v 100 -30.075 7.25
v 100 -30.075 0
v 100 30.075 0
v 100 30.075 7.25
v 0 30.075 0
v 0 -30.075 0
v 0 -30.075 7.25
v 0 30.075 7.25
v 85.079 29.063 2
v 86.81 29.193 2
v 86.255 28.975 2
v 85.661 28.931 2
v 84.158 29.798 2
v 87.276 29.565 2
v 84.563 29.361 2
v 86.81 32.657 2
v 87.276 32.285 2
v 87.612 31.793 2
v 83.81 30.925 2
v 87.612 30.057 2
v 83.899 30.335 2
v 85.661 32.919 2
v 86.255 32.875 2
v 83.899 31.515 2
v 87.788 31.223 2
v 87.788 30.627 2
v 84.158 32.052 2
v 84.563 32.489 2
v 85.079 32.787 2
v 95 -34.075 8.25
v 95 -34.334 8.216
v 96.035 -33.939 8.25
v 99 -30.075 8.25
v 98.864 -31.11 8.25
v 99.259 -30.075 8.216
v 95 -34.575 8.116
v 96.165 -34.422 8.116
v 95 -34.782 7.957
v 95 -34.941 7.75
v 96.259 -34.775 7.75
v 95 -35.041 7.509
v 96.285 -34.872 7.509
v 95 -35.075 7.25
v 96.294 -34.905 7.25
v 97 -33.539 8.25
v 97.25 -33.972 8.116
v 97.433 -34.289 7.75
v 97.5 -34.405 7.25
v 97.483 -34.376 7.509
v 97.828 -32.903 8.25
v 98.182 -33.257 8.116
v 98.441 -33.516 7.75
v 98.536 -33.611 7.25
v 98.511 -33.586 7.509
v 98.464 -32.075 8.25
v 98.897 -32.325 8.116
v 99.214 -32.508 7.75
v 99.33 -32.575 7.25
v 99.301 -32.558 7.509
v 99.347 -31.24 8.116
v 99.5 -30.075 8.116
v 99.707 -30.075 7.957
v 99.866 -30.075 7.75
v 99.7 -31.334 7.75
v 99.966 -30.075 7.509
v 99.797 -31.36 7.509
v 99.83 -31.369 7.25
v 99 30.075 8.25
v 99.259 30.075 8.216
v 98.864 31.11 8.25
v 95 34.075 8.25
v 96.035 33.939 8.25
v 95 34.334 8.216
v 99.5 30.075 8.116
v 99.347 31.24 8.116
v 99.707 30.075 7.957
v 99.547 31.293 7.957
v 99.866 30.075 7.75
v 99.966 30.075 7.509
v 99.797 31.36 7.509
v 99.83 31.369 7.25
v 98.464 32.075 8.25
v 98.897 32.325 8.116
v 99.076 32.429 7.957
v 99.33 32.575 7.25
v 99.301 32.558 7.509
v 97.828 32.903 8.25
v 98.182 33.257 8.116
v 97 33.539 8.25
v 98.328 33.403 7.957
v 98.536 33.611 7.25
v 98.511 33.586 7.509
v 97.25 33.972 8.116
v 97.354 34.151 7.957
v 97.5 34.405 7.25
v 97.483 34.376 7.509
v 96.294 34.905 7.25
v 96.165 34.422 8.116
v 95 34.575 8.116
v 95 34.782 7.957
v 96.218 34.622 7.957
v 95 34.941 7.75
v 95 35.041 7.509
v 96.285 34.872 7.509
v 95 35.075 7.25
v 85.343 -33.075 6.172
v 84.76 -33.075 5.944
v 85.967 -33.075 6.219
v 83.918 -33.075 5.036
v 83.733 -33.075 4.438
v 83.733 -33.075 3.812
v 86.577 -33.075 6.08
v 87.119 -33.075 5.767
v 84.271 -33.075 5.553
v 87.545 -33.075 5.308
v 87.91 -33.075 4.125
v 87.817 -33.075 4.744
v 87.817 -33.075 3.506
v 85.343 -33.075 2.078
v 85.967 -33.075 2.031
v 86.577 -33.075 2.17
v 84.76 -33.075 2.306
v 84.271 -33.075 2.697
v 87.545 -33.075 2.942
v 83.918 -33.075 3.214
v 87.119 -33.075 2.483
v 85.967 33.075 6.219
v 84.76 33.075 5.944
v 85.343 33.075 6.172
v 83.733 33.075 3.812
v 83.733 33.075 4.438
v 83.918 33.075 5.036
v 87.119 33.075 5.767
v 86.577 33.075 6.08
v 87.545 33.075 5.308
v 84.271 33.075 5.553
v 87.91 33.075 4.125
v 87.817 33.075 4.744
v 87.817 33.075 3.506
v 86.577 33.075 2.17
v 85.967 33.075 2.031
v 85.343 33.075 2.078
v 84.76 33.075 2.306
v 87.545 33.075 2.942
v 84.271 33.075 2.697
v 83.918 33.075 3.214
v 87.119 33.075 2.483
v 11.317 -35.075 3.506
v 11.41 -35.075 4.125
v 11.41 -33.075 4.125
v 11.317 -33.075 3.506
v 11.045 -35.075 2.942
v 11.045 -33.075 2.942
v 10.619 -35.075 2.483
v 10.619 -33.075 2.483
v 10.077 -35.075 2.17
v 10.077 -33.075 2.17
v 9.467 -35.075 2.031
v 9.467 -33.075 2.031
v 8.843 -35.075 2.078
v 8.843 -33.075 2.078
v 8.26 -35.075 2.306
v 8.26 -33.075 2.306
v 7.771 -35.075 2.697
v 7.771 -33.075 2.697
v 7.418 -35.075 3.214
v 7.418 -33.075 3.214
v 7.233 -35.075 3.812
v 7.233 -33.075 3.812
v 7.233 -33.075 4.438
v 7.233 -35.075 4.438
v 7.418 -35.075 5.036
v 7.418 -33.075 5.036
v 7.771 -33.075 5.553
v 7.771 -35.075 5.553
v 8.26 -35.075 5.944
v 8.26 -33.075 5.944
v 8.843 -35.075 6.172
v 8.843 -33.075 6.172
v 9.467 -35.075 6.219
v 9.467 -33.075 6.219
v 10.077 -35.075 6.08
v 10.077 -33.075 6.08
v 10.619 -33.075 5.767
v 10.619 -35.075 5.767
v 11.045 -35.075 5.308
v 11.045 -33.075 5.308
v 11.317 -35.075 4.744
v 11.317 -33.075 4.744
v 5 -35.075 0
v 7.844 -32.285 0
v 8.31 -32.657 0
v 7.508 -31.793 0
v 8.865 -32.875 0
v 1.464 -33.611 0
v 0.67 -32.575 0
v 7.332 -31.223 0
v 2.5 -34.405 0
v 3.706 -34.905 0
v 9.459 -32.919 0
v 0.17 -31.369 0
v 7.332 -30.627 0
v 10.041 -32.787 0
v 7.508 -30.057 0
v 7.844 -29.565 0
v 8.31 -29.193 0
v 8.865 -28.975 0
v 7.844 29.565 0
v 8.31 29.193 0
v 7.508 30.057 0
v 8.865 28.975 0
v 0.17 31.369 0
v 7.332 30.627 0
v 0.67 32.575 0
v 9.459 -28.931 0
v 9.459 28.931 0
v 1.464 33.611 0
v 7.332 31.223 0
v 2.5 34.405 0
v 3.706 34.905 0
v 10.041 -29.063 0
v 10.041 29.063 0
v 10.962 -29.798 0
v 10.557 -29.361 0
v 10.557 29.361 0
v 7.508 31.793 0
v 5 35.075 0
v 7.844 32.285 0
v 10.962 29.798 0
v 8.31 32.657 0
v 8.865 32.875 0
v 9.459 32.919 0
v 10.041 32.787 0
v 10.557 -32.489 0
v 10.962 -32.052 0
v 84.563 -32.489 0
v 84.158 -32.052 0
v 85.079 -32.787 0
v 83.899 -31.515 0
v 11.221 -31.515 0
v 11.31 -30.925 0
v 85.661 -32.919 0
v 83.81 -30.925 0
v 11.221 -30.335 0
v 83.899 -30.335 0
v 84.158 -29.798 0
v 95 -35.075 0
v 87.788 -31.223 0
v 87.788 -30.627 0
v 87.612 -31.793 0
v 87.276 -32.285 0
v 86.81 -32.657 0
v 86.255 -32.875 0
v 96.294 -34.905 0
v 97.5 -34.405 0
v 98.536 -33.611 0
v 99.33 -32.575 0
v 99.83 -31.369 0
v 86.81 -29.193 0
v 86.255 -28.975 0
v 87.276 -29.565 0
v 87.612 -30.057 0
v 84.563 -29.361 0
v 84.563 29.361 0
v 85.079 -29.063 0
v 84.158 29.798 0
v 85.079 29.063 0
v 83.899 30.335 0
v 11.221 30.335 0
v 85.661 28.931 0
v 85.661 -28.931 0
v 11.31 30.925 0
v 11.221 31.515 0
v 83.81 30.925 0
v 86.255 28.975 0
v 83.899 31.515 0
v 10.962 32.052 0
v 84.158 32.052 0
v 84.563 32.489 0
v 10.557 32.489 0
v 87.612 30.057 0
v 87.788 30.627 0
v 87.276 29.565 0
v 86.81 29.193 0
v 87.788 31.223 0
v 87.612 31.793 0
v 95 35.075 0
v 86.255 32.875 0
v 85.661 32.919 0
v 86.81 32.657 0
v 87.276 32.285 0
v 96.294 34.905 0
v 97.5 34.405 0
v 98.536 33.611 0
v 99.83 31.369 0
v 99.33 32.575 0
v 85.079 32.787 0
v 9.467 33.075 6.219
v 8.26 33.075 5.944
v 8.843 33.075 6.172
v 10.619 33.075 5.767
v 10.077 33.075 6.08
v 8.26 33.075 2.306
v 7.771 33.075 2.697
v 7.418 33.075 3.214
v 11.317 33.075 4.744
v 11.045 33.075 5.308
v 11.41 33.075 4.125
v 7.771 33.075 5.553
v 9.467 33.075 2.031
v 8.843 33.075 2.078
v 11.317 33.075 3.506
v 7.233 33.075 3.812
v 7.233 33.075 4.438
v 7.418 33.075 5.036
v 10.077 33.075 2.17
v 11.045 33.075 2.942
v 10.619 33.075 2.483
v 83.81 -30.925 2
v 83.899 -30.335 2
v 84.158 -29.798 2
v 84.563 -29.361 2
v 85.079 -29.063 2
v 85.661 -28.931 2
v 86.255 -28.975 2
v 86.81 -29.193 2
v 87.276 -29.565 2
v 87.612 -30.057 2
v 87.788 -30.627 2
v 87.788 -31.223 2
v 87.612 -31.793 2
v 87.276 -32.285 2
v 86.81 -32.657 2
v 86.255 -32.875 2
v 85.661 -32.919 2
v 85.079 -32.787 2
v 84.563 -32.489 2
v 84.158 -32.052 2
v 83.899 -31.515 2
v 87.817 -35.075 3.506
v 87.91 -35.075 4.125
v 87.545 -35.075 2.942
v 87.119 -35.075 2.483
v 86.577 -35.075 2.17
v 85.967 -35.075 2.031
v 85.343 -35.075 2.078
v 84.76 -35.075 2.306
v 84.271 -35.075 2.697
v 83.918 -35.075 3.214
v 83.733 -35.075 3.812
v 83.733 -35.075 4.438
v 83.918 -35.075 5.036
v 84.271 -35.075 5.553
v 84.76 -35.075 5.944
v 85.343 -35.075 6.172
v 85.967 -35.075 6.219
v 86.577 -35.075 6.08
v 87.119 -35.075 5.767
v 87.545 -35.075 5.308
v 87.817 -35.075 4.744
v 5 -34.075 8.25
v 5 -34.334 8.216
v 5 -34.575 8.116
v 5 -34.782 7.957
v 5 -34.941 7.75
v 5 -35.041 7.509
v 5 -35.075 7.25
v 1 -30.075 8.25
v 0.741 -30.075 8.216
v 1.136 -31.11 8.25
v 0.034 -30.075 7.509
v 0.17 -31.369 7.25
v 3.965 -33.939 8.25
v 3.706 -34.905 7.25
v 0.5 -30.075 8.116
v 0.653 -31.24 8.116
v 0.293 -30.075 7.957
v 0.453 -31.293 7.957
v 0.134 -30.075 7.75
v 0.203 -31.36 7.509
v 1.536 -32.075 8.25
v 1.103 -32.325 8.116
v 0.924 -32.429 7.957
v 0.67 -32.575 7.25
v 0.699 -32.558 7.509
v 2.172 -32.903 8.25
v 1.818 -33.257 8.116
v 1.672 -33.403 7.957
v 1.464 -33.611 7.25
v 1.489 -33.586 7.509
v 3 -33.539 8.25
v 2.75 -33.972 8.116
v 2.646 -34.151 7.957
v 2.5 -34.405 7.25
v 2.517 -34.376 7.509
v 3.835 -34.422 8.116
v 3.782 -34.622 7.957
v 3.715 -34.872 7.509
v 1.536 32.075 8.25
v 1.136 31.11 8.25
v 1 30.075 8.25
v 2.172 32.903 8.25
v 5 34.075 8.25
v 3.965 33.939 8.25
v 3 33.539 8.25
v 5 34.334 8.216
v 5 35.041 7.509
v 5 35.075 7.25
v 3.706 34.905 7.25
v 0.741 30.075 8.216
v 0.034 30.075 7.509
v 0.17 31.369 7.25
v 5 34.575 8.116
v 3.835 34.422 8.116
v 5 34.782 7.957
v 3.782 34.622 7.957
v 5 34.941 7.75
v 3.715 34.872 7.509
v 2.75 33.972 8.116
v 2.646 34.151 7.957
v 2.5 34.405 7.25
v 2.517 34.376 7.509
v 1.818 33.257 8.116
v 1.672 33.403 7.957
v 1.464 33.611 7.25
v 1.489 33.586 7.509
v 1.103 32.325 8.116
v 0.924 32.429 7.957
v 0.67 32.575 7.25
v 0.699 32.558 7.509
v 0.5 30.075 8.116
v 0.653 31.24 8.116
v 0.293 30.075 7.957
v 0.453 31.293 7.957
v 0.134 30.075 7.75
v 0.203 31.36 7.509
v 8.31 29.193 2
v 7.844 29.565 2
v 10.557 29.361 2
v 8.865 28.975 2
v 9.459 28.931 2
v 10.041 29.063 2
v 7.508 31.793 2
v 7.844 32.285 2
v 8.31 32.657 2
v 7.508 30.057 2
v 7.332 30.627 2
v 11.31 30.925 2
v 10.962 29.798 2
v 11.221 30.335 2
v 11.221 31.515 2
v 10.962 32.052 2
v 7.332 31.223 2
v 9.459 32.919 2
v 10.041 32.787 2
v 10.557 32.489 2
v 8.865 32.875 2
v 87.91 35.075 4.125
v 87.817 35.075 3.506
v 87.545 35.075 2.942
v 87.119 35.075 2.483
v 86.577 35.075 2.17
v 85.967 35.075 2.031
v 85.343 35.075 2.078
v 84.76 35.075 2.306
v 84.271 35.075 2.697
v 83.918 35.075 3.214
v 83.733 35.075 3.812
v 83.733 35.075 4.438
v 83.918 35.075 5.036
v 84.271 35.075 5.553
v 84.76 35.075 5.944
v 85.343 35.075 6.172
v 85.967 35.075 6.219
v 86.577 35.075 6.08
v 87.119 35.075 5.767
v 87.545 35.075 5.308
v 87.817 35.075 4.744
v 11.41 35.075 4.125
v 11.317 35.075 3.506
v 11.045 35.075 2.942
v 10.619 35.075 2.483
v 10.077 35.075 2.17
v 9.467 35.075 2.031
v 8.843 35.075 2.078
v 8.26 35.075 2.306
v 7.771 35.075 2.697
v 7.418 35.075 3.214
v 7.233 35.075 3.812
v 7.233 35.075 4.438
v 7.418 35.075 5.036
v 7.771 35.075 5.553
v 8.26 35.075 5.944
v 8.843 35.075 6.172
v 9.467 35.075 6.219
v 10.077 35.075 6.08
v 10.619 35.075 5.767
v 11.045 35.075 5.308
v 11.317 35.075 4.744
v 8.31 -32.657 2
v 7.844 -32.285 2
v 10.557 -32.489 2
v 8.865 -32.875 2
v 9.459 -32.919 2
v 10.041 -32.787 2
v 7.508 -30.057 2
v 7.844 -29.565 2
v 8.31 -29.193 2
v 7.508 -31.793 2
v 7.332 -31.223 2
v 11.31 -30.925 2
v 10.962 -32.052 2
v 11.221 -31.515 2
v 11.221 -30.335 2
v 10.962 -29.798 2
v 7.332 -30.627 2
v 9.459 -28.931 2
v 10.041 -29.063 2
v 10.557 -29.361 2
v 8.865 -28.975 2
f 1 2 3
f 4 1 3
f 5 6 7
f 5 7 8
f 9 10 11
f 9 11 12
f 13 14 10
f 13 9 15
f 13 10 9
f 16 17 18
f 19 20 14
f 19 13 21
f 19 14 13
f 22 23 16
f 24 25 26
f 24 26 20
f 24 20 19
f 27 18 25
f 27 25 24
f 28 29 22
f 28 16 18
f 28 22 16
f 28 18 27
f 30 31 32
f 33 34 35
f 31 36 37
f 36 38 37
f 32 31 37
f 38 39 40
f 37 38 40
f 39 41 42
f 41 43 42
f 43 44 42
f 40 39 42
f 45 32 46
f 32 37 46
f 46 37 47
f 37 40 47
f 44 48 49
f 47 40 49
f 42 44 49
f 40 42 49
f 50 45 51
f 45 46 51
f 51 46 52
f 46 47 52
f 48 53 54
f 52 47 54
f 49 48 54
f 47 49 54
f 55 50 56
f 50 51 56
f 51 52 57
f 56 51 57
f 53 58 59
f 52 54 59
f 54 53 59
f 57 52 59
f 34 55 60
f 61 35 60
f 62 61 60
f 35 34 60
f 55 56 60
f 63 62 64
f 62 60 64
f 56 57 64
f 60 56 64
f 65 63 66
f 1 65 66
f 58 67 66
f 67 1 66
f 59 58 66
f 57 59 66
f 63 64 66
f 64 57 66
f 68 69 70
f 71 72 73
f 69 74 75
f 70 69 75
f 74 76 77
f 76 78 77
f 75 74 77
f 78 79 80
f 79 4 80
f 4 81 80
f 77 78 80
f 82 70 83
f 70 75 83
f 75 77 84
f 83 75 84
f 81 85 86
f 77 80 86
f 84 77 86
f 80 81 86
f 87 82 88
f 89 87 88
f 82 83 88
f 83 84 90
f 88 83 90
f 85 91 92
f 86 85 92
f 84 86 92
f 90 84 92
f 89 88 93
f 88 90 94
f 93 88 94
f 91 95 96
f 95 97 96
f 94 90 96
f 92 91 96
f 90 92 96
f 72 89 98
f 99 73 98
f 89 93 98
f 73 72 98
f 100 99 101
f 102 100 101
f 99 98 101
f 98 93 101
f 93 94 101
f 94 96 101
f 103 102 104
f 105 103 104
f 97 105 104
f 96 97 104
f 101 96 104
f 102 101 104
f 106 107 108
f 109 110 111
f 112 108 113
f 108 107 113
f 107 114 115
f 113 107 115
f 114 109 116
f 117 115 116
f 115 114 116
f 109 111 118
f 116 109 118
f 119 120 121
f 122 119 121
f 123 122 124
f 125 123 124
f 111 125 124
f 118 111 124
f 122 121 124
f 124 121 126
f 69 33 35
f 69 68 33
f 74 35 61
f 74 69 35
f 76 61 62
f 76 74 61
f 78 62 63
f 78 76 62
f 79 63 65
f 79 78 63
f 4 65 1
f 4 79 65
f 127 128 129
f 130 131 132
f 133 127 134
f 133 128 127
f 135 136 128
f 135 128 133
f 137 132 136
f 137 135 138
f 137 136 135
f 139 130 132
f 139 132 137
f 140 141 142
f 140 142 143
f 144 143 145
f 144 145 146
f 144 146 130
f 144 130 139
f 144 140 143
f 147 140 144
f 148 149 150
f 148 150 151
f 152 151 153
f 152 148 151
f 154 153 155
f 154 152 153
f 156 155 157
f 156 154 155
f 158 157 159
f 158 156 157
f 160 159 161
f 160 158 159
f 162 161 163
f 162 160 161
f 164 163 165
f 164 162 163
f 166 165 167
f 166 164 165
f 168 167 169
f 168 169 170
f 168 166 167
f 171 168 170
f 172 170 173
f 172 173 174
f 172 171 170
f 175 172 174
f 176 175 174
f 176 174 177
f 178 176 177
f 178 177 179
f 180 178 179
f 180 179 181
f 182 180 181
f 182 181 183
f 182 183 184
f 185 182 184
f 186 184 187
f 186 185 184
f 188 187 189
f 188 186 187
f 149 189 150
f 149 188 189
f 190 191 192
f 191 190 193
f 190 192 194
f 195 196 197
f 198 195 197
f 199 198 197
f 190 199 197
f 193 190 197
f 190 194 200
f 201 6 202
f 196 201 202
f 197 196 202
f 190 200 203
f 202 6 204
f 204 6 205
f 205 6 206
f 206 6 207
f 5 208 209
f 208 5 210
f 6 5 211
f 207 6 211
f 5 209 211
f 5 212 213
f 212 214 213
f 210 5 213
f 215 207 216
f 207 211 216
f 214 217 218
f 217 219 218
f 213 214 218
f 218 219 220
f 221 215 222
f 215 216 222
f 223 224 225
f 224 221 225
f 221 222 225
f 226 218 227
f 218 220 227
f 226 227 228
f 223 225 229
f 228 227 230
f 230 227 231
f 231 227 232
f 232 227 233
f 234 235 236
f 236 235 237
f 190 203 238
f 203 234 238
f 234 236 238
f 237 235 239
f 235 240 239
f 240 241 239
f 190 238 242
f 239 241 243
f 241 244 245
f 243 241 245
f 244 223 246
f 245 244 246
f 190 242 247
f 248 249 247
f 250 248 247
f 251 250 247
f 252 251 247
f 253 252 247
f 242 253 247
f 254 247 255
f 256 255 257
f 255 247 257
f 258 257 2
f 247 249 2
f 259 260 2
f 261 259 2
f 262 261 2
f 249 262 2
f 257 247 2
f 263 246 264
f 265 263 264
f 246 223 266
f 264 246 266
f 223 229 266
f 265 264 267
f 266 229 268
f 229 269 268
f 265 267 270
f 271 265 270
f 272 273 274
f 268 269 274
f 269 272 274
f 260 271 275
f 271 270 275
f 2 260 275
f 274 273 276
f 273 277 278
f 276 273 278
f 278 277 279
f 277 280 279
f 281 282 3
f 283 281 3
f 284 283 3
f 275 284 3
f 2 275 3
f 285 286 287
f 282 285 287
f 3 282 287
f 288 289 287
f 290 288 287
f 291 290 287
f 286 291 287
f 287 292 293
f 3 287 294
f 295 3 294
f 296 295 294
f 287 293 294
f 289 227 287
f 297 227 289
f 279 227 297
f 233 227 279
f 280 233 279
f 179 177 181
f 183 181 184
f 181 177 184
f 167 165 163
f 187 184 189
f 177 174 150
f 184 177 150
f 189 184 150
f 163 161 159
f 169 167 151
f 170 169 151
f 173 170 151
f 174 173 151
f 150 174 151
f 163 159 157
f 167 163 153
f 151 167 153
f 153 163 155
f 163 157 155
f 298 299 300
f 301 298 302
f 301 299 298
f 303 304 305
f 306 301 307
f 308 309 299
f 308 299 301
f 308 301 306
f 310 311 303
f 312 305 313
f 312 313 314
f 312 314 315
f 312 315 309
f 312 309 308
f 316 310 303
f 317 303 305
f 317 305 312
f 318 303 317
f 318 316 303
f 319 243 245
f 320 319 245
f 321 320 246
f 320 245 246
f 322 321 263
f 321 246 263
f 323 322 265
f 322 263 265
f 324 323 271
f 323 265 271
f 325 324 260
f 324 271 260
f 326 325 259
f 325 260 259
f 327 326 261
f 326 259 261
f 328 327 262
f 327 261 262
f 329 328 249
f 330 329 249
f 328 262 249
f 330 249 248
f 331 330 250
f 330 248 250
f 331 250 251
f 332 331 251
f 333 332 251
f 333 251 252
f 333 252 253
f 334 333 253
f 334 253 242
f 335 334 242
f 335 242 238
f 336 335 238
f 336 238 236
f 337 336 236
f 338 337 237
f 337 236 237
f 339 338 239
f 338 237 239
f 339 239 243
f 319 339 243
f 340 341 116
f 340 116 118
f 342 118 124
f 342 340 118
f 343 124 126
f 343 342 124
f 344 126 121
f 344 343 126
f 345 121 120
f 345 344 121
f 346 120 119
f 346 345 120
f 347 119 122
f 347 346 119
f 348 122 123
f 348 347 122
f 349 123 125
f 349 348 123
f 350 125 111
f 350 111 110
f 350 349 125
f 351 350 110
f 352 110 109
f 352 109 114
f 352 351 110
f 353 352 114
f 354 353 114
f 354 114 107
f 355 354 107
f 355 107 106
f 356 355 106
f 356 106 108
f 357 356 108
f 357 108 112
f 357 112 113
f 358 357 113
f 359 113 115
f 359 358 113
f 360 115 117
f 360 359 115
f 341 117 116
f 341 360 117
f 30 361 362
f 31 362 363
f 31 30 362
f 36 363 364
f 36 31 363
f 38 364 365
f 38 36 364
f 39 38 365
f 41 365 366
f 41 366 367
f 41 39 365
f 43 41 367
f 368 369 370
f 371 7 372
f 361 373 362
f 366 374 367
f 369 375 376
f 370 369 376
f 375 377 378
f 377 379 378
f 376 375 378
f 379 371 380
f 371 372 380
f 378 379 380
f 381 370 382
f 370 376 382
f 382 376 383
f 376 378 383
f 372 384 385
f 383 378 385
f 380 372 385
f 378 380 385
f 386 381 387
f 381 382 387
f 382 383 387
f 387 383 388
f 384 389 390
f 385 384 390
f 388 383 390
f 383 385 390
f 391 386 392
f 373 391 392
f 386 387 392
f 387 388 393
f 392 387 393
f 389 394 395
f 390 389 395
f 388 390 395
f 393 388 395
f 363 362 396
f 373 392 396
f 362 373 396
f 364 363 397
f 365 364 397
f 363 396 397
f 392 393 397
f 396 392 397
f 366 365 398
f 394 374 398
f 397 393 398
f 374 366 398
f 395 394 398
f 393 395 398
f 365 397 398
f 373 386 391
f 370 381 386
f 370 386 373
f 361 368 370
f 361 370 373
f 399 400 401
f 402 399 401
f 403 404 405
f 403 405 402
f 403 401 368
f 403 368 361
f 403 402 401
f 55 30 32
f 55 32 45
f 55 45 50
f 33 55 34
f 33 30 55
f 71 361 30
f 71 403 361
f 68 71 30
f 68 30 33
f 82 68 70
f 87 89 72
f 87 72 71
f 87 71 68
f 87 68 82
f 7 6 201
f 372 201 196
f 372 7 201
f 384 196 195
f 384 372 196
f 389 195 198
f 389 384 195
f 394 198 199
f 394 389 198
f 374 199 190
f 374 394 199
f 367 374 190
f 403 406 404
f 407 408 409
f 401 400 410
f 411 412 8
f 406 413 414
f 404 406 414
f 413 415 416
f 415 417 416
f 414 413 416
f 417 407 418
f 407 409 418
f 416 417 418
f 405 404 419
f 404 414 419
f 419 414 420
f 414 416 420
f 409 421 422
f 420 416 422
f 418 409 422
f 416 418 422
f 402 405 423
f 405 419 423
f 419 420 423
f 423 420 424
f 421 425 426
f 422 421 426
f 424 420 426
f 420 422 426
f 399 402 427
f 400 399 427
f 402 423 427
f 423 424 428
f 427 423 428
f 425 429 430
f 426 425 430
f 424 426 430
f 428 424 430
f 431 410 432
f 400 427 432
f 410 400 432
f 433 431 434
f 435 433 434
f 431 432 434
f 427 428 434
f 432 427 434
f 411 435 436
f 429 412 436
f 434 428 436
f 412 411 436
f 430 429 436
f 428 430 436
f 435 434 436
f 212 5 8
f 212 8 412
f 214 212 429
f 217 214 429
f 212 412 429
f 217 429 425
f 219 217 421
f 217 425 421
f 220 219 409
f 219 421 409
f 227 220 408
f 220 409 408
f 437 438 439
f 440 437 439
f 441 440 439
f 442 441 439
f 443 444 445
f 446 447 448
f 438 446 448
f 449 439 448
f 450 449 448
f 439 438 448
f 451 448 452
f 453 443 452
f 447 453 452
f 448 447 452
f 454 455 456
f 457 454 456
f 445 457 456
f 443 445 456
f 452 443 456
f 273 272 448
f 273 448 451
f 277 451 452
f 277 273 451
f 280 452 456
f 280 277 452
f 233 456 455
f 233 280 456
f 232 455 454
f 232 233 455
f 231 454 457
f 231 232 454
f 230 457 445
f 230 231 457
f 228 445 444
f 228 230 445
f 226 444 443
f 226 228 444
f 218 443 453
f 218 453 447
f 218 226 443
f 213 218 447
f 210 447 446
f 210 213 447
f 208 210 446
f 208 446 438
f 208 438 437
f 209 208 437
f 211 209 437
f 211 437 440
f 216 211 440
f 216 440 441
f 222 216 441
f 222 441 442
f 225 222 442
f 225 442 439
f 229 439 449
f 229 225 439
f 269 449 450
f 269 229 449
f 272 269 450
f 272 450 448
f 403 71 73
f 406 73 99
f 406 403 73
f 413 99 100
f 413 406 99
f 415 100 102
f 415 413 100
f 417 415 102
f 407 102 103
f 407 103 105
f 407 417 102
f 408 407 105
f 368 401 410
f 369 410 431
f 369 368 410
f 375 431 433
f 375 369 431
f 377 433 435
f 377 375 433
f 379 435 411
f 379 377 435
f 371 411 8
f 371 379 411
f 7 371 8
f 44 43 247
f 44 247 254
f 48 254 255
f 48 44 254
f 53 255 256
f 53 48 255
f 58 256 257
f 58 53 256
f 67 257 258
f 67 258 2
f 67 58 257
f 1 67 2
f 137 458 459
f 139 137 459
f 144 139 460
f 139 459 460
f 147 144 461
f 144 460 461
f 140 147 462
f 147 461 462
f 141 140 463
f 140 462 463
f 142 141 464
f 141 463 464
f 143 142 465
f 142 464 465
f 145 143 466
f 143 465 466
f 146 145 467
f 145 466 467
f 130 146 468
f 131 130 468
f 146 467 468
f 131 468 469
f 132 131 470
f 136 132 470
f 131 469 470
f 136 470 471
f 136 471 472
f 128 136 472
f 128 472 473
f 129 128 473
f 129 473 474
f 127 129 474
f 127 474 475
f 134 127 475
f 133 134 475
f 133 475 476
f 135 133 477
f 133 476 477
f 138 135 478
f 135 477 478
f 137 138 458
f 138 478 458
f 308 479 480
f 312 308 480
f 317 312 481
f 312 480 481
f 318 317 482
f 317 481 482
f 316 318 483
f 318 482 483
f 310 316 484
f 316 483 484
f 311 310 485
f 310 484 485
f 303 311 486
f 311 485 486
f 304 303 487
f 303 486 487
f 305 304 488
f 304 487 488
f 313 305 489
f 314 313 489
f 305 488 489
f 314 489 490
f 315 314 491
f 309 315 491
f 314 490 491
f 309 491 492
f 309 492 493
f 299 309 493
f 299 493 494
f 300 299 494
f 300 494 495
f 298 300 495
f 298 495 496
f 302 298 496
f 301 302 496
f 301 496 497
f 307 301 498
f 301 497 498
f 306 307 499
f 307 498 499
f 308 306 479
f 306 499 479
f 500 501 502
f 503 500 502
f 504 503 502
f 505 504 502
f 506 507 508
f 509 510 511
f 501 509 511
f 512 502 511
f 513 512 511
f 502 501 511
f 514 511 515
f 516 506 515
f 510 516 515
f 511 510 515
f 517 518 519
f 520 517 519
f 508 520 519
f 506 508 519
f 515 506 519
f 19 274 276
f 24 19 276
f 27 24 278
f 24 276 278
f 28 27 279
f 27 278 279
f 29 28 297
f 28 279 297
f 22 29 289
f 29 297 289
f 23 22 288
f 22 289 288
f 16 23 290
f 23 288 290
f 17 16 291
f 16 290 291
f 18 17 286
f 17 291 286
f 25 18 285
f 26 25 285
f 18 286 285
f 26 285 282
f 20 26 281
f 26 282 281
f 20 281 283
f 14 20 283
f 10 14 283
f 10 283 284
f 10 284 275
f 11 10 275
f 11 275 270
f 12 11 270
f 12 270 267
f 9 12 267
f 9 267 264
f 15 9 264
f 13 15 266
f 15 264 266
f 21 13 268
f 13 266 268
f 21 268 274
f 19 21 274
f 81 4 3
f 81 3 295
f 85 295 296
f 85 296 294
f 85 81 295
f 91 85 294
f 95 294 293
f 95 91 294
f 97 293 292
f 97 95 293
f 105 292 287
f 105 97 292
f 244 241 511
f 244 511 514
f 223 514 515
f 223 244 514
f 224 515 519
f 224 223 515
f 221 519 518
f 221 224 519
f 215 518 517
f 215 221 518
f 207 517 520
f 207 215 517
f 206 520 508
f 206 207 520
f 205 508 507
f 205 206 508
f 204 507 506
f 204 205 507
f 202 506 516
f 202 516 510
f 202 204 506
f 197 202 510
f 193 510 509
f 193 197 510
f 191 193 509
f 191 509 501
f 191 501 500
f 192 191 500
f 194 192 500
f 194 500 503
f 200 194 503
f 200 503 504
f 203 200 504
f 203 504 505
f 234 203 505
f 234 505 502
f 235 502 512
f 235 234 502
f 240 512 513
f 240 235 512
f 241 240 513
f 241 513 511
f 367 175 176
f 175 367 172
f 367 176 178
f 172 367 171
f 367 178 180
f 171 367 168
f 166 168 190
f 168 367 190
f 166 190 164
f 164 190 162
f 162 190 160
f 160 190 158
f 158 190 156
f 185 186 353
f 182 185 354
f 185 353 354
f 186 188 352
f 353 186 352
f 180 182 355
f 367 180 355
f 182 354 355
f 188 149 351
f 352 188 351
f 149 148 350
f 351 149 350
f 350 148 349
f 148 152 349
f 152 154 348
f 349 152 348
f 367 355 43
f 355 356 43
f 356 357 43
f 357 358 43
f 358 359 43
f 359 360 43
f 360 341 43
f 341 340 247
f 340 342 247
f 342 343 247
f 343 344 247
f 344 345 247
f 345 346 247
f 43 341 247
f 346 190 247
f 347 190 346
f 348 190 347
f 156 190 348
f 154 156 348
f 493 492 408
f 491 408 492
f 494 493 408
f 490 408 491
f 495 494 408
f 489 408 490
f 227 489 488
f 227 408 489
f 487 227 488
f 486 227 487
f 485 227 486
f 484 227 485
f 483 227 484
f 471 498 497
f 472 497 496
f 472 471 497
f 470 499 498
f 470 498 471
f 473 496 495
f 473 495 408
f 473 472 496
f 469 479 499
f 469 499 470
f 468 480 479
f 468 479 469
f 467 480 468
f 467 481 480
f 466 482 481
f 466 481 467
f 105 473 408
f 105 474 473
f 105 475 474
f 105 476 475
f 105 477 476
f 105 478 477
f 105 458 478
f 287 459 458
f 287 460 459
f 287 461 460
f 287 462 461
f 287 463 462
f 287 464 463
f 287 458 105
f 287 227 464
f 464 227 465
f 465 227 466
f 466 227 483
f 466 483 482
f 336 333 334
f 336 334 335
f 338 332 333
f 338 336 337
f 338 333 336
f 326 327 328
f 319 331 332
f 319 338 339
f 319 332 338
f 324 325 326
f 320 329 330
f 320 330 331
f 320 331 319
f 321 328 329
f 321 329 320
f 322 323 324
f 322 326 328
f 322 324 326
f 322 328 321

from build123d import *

# Parameters (mm, degrees)
SKETCH2_W           = 100
SKETCH2_H           = 70.15
BOSS_EXTRUDE1_DEPTH = 8.25
FILLET1_R           = 5
CUT_EXTRUDE1_START  = -35.075
SKETCH3_R           = 2.1
CUT_EXTRUDE1_DEPTH  = 2
FILLET2_R           = 1
SKETCH4_R           = 2
CUT_EXTRUDE2_DEPTH  = 2


with BuildPart() as part:
    # Sketch2 → Boss-Extrude1 (new body)
    with BuildSketch(Plane.XY):
        with Locations((50, 0)):
            Rectangle(SKETCH2_W, SKETCH2_H)
    extrude(amount=BOSS_EXTRUDE1_DEPTH)

    # Fillet1
    fillet1_edges = [part.edges().sort_by_distance(p)[0] for p in [
        (0, 35.075, 4.125),
        (100, 35.075, 4.125),
        (100, -35.075, 4.125),
        (0, -35.075, 4.125),
    ]]
    fillet(fillet1_edges, radius=FILLET1_R)

    # Sketch3 → Cut-Extrude1 (cut)
    with BuildSketch(Plane(origin=(0, 0, 0), x_dir=(1, 0, 0), z_dir=(0, 1, 0)).offset(CUT_EXTRUDE1_START)):
        with Locations((9.31, -4.125)):
            Circle(SKETCH3_R)
        with Locations((85.81, -4.125)):
            Circle(SKETCH3_R)
    cut_extrude1 = extrude(amount=CUT_EXTRUDE1_DEPTH, mode=Mode.SUBTRACT)

    # Mirror1: Cut-Extrude1 across plane
    add(cut_extrude1.mirror(Plane.ZX), mode=Mode.SUBTRACT)

    # Fillet2
    fillet2_edges = [part.edges().sort_by_distance(p)[0] for p in [
        (100, 0, 8.25),
        (50, -35.075, 8.25),
        (0, 0, 8.25),
        (50, 35.075, 8.25),
        (1.464466094, 33.610533906, 8.25),
        (98.535533906, 33.610533906, 8.25),
        (1.464466094, -33.610533906, 8.25),
        (98.535533906, -33.610533906, 8.25),
    ]]
    fillet(fillet2_edges, radius=FILLET2_R)

    # Sketch4 → Cut-Extrude2 (cut)
    with BuildSketch(Plane.XY):
        with Locations((9.31, -30.925)):
            Circle(SKETCH4_R)
        with Locations((9.31, 30.925)):
            Circle(SKETCH4_R)
    cut_extrude2 = extrude(amount=CUT_EXTRUDE2_DEPTH, mode=Mode.SUBTRACT)

    # Mirror2: Cut-Extrude2 across plane
    add(cut_extrude2.mirror(Plane(origin=(47.56, 0, 0), x_dir=(0, 0, 1), z_dir=(1, 0, 0))), mode=Mode.SUBTRACT)


solid = part.part
